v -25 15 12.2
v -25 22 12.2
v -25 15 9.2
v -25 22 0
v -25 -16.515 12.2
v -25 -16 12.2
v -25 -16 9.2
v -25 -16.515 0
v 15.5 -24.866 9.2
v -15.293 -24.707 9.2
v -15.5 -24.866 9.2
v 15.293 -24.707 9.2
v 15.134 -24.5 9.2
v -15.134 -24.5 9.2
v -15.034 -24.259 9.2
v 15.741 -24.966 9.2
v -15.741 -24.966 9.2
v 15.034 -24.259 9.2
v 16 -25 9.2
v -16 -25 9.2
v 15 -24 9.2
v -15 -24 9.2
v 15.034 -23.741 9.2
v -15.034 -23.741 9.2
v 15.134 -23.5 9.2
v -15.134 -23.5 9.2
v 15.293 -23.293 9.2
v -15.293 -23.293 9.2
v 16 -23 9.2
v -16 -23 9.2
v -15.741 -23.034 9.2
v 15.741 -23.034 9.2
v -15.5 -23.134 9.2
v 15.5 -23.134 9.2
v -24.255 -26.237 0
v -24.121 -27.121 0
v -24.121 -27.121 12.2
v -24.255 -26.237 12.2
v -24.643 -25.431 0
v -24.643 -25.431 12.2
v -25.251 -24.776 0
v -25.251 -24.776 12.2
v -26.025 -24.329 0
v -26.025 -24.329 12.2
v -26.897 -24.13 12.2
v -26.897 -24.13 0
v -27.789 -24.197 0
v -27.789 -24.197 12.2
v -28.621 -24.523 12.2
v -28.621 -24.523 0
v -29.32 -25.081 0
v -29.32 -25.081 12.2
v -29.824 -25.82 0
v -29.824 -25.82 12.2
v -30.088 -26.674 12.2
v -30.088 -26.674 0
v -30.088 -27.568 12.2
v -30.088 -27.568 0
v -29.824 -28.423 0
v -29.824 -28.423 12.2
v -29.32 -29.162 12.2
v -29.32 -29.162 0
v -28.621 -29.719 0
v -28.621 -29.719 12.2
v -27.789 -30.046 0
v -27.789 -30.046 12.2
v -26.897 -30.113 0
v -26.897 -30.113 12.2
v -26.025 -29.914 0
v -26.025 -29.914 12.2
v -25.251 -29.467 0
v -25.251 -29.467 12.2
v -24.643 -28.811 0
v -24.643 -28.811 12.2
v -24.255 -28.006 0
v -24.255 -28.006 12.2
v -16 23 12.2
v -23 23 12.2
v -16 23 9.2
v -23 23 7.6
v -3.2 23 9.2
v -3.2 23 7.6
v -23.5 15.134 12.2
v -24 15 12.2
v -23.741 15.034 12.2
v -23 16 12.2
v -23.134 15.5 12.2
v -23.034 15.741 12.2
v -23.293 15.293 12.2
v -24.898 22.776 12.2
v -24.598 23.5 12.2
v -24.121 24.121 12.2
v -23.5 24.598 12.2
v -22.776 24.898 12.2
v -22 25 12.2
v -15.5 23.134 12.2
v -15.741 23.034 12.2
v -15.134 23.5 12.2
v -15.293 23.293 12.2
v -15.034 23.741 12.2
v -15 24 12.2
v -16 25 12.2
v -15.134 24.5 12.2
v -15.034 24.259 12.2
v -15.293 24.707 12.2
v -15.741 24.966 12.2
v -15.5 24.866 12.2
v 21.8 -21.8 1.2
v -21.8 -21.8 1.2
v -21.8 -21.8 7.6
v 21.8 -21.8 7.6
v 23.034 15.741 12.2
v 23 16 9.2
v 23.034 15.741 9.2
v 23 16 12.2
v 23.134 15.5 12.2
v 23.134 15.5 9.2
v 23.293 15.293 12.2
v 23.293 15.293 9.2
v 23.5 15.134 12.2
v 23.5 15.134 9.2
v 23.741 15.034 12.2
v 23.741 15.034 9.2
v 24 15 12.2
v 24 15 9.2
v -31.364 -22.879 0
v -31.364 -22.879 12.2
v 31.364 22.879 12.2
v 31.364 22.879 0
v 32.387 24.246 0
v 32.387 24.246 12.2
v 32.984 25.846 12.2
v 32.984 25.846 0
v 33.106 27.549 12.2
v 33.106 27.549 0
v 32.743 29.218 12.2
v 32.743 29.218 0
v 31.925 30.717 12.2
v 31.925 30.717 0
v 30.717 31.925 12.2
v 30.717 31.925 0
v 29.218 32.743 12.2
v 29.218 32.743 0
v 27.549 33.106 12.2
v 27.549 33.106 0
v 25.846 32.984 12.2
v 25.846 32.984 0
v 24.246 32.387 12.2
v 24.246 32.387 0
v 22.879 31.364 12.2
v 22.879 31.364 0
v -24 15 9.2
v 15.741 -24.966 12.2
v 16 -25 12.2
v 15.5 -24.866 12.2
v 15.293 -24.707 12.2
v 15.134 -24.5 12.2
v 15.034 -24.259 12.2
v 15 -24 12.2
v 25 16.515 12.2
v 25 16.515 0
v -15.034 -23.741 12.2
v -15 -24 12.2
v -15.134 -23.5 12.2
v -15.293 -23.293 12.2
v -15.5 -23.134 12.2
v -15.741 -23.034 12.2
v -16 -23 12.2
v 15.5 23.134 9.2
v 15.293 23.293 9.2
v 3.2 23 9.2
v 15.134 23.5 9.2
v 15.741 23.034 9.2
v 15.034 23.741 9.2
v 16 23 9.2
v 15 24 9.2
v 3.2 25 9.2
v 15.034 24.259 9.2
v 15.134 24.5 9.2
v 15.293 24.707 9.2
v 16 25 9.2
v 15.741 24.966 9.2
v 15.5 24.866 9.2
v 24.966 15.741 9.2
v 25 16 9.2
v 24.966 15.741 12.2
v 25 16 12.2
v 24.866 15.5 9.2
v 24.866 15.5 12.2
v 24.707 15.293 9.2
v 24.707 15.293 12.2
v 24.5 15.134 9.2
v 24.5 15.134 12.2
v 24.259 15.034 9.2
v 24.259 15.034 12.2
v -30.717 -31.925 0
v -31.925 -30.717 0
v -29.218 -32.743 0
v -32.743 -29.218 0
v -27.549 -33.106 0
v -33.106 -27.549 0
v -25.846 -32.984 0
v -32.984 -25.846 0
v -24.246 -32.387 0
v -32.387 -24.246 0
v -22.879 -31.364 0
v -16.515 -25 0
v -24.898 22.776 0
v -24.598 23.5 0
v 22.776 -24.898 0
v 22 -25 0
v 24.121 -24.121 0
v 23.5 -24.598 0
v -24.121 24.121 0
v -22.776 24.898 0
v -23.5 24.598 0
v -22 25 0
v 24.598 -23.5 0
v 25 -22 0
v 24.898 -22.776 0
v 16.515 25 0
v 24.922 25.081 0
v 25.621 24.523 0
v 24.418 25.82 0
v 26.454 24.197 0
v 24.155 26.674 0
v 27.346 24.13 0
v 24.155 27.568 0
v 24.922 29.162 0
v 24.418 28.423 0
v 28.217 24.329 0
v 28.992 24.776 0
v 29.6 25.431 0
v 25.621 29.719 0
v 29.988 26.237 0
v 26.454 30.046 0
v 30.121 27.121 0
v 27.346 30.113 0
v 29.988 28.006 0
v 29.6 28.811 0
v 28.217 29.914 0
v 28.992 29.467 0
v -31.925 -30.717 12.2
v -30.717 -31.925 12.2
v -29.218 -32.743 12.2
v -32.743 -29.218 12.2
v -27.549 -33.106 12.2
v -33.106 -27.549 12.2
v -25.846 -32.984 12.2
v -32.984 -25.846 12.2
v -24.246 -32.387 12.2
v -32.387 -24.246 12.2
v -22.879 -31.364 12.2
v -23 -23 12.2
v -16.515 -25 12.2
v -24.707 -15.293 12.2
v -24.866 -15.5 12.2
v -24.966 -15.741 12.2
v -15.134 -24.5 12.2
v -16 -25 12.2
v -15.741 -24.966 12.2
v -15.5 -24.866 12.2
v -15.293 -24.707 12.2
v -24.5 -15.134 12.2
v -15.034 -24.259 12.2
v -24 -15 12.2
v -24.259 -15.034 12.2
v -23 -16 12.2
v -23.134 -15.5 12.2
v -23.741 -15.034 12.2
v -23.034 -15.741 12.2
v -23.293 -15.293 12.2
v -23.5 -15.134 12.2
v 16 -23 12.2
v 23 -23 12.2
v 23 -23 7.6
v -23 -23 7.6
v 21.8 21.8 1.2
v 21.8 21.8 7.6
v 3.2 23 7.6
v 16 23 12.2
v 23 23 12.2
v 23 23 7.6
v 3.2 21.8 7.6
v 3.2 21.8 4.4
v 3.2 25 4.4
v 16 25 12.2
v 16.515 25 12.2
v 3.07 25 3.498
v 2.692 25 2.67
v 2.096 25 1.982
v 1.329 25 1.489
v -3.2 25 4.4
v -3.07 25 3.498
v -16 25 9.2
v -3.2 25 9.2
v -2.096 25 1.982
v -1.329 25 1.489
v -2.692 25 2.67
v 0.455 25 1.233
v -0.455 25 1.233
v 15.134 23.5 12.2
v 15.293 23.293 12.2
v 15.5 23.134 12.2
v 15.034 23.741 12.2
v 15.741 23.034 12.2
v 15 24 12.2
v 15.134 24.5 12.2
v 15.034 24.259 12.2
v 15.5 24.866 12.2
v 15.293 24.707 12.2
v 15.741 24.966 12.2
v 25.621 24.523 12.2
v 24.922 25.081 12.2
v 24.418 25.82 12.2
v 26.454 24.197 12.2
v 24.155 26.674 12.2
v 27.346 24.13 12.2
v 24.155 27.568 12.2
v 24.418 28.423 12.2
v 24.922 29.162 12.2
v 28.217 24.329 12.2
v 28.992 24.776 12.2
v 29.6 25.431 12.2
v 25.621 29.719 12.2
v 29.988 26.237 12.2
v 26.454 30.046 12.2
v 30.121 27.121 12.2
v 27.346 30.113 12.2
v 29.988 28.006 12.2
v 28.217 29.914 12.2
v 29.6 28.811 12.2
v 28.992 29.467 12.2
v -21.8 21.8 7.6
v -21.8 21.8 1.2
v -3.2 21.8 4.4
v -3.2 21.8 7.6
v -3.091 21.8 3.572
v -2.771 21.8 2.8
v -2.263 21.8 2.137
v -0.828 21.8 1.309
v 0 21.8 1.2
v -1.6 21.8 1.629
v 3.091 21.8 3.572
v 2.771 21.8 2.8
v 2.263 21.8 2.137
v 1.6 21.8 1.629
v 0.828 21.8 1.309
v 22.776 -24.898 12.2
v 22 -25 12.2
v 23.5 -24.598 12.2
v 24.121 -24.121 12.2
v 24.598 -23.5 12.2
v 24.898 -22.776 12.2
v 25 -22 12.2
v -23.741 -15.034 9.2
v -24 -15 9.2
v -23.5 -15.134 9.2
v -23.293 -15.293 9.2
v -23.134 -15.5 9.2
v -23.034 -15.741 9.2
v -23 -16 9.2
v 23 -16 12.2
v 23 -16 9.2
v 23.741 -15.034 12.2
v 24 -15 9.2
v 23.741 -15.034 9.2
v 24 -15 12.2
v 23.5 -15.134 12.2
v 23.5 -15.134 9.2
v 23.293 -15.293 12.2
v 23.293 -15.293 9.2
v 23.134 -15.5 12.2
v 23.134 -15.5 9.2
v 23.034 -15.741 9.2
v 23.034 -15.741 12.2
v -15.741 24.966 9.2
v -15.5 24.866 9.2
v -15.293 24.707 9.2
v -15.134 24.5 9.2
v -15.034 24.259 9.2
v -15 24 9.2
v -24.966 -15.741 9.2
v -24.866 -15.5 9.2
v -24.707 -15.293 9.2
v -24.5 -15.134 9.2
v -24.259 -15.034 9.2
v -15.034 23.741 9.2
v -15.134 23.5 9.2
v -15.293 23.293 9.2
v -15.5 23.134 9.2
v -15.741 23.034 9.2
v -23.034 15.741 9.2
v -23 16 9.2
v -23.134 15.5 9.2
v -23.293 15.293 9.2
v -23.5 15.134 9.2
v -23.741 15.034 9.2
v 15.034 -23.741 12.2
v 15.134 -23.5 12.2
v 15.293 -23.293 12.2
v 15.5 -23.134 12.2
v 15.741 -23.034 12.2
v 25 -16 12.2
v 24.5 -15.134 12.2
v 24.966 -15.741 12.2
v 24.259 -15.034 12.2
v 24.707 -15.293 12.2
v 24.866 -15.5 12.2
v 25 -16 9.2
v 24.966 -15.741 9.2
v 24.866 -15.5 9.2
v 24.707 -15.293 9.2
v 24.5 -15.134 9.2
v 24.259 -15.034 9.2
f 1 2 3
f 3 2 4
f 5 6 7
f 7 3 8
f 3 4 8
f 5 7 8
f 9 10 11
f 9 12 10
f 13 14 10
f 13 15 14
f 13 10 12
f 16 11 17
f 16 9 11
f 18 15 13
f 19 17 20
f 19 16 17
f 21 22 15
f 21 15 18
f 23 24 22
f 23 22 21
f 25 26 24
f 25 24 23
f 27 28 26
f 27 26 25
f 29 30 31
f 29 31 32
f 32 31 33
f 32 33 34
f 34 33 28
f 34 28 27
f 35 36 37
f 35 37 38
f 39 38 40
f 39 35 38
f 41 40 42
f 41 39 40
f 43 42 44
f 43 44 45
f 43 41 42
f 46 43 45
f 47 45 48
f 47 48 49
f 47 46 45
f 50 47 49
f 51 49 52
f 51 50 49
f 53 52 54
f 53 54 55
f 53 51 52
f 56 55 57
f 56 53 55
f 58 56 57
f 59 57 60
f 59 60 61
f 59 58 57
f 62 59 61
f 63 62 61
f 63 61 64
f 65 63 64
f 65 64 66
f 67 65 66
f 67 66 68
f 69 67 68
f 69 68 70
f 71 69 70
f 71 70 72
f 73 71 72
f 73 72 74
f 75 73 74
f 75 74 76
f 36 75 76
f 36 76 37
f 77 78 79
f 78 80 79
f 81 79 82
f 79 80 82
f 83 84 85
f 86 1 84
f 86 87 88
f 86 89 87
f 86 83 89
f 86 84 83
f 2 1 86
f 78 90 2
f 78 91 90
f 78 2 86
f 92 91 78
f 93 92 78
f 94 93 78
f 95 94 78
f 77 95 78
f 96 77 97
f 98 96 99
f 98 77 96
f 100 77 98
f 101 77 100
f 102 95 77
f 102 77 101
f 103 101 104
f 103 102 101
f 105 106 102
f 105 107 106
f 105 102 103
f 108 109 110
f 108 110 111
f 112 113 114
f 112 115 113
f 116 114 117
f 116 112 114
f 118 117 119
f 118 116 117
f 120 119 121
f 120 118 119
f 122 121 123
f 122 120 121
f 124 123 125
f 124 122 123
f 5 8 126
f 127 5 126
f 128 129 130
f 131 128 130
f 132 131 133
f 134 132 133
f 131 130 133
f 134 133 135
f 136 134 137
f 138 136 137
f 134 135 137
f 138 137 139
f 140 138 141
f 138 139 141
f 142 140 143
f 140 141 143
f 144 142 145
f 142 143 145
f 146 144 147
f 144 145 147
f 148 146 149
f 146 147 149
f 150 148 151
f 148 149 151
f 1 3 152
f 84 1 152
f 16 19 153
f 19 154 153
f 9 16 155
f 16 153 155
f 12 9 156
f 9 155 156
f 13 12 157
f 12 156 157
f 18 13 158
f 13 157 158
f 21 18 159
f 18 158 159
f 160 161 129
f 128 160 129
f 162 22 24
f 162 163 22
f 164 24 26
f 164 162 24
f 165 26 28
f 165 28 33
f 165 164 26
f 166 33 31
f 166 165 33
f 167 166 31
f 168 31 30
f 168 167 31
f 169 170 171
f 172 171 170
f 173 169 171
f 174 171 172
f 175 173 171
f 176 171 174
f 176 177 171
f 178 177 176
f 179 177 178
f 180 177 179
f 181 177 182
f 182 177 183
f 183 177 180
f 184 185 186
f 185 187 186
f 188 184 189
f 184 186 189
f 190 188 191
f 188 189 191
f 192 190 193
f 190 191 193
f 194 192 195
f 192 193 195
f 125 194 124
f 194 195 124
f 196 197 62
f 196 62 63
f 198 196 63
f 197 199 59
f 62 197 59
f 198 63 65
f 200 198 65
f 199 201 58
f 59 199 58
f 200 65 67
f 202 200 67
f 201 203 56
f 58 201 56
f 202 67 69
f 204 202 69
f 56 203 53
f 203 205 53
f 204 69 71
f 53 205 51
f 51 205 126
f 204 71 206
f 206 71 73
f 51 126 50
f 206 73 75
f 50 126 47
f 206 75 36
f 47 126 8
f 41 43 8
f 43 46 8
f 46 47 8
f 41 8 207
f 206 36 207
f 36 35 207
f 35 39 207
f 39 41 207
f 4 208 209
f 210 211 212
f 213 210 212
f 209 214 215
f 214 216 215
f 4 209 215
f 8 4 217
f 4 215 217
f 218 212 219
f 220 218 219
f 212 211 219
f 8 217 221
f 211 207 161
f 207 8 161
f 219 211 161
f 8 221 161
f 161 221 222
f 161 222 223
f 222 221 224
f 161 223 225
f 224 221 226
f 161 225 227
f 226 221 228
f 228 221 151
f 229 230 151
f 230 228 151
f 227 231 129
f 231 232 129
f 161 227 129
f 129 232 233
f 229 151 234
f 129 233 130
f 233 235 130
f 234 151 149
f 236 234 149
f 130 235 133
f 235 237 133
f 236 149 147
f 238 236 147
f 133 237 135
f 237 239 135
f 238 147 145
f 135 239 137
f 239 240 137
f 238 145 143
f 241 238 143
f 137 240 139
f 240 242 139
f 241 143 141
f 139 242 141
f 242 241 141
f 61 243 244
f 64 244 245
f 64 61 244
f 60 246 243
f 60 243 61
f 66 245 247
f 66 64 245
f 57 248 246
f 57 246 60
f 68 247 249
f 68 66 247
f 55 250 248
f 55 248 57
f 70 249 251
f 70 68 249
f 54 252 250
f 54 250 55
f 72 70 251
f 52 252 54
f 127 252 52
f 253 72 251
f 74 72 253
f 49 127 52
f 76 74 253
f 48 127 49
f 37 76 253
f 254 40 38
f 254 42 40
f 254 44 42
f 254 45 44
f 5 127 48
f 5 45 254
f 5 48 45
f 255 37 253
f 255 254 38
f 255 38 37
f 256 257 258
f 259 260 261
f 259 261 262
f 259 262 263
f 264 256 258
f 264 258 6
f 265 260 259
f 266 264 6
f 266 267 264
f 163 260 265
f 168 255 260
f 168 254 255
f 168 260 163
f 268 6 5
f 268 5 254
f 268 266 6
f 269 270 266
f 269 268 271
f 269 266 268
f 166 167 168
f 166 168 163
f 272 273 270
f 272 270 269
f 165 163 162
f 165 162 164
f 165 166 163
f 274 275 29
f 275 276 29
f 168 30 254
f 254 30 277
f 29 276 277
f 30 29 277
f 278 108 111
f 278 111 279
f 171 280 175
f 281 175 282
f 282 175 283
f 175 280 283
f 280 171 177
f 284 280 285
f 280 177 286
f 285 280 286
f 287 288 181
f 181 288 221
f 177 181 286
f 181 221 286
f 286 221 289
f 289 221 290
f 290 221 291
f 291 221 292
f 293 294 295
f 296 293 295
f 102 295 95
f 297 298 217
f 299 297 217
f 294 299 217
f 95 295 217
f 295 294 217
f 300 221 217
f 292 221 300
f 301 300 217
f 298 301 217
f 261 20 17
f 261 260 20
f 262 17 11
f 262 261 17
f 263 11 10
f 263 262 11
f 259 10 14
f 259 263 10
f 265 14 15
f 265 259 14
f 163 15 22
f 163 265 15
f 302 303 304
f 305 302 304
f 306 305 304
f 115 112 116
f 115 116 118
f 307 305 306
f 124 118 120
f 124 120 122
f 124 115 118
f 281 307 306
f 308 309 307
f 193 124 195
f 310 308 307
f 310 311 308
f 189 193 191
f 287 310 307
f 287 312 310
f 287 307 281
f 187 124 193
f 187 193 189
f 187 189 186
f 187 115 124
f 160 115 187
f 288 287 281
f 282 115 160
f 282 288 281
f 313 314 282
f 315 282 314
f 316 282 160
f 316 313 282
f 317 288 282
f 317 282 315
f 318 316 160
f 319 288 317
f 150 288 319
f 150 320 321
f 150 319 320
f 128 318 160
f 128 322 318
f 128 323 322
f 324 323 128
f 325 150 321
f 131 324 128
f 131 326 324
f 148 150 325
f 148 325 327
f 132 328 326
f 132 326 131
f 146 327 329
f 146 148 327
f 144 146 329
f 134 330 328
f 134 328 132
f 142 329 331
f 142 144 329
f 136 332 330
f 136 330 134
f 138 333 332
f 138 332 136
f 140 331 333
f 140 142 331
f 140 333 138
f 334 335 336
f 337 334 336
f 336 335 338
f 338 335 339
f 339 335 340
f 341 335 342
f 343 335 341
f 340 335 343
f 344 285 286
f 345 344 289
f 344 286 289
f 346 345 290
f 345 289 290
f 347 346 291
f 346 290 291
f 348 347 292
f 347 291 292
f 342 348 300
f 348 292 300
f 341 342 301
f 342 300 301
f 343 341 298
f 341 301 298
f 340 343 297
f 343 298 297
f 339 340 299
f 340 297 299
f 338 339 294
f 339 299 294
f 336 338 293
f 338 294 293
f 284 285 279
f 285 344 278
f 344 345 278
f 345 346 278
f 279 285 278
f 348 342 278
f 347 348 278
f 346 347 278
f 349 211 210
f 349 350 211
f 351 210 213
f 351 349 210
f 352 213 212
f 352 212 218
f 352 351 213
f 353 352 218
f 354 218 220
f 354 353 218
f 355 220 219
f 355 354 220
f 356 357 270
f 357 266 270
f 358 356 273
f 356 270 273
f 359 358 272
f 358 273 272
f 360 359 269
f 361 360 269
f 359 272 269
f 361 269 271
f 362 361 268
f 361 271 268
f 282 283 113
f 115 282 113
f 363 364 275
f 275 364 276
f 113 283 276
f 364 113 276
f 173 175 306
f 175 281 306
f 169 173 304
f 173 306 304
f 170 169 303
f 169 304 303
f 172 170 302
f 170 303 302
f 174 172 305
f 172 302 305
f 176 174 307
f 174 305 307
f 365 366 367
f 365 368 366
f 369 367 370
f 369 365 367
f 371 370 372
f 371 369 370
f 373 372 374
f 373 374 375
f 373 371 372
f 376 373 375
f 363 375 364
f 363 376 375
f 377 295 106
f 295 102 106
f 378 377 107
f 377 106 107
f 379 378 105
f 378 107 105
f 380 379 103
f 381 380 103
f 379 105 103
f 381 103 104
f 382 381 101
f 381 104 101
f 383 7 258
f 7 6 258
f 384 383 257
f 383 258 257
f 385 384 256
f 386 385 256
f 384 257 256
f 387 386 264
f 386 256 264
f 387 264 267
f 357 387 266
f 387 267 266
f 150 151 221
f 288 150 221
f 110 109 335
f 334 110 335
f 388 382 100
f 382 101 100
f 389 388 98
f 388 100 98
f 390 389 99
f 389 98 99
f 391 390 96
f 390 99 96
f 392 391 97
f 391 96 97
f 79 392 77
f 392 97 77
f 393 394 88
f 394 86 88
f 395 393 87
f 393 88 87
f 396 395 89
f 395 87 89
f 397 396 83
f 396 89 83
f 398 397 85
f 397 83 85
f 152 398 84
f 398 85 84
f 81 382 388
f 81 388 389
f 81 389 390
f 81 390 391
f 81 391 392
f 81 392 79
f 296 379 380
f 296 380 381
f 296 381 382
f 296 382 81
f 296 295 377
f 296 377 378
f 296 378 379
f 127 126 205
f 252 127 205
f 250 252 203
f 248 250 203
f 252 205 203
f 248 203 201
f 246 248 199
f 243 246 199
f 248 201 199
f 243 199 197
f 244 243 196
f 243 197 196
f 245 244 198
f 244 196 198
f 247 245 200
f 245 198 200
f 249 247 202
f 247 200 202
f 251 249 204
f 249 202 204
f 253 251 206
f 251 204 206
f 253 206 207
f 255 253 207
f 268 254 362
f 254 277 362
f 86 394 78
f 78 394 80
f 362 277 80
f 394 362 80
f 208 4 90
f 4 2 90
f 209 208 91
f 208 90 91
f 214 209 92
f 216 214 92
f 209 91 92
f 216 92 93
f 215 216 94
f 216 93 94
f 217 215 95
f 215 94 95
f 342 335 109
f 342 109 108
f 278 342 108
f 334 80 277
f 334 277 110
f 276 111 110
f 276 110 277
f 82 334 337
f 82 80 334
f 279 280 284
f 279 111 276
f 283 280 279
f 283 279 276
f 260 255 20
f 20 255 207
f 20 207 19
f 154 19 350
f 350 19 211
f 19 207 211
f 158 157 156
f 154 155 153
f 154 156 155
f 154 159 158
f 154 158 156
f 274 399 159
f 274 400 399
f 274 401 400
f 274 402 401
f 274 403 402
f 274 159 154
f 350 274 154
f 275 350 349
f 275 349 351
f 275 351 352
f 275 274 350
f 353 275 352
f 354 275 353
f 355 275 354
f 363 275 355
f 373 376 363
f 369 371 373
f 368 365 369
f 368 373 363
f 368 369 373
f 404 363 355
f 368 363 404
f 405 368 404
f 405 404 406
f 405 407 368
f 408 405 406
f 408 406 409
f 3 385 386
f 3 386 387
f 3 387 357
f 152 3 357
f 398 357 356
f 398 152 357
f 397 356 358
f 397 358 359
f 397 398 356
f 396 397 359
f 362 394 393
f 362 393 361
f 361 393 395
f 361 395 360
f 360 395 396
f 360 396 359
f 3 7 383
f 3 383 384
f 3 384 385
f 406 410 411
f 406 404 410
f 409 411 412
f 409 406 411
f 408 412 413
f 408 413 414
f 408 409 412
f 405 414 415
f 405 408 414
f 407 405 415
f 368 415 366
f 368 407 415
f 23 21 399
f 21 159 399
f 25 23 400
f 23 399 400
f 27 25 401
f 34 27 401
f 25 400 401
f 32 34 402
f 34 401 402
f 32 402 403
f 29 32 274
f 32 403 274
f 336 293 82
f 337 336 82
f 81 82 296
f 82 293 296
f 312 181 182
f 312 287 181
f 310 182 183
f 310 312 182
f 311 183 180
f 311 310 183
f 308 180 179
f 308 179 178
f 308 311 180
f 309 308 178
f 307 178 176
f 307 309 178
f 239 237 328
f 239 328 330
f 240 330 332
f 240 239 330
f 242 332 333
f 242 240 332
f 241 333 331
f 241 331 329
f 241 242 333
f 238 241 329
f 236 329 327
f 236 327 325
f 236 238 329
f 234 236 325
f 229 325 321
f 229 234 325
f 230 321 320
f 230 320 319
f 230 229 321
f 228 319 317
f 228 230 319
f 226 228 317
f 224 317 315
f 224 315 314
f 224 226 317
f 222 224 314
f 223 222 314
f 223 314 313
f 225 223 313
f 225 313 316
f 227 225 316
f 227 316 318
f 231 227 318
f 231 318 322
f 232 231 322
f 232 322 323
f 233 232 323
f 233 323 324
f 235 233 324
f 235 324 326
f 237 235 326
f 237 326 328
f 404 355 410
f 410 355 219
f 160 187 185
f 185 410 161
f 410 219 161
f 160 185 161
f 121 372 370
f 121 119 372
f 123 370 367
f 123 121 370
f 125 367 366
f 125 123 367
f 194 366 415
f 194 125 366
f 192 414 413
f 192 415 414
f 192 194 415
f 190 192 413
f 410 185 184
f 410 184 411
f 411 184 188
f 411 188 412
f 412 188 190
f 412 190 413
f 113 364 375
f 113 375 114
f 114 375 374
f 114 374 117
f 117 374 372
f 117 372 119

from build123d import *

# Parameters (mm, degrees)
F0_R     = 3
F1_DEPTH = 1.2
F2_R     = 3
F2_W     = 43.6
F2_H     = 43.6
F3_DEPTH = 6.4
F4_R     = 3
F4_W     = 46
F4_H     = 46
F5_DEPTH = 1.6
F6_R     = 3
F7_DEPTH = 3
F9_DEPTH = 3.2
F10_R    = 0.99999
F11_R    = 3


# Not quite as in the source:
# - a fillet or chamfer is up to 0.001 mm smaller than in the source, because OpenCascade refuses the exact size


with BuildPart() as f1:
    # F0 (on Top) → F1 (new body)
    with BuildSketch(Plane.XY):
        with BuildLine():
            Line((22.8786796564, 31.3639610307), (16.5147186258, 25))
            Line((16.5147186258, 25), (-25, 25))
            Line((-25, 25), (-25, -16.5147186258))
            Line((-25, -16.5147186258), (-31.3639610307, -22.8786796564))
            ThreePointArc((-31.3639610307, -22.8786796564), (-31.3639610307, -31.3639610307), (-22.8786796564, -31.3639610307))
            Line((-22.8786796564, -31.3639610307), (-16.5147186258, -25))
            Line((-16.5147186258, -25), (25, -25))
            Line((25, -25), (25, 16.5147186258))
            Line((25, 16.5147186258), (31.3639610307, 22.8786796564))
            ThreePointArc((31.3639610307, 22.8786796564), (31.3639610307, 31.3639610307), (22.8786796564, 31.3639610307))
        make_face()
        with Locations((-27.1213203436, -27.1213203436)):
            Circle(F0_R, mode=Mode.SUBTRACT)
        with Locations((27.1213203436, 27.1213203436)):
            Circle(F0_R, mode=Mode.SUBTRACT)
    extrude(amount=F1_DEPTH)

    # F2 (on face) → F3 (join)
    with BuildSketch(Plane.XY.offset(1.2)):
        with BuildLine():
            Line((-16.5147186258, -25), (25, -25))
            Line((25, -25), (25, 16.5147186258))
            Line((25, 16.5147186258), (31.3639610307, 22.8786796564))
            ThreePointArc((31.3639610307, 22.8786796564), (31.3639610307, 31.3639610307), (22.8786796564, 31.3639610307))
            Line((22.8786796564, 31.3639610307), (16.5147186258, 25))
            Line((16.5147186258, 25), (-25, 25))
            Line((-25, 25), (-25, -16.5147186258))
            Line((-25, -16.5147186258), (-31.3639610307, -22.8786796564))
            ThreePointArc((-31.3639610307, -22.8786796564), (-31.3639610307, -31.3639610307), (-22.8786796564, -31.3639610307))
            Line((-22.8786796564, -31.3639610307), (-16.5147186258, -25))
        make_face()
        with Locations((-27.1213203436, -27.1213203436)):
            Circle(F2_R, mode=Mode.SUBTRACT)
        Rectangle(F2_W, F2_H, mode=Mode.SUBTRACT)
        with Locations((27.1213203436, 27.1213203436)):
            Circle(F2_R, mode=Mode.SUBTRACT)
    extrude(amount=F3_DEPTH)

    # F4 (on face) → F5 (join)
    with BuildSketch(Plane.XY.offset(7.6)):
        with BuildLine():
            Line((-16.5147186258, -25), (25, -25))
            Line((25, -25), (25, 16.5147186258))
            Line((25, 16.5147186258), (31.3639610307, 22.8786796564))
            ThreePointArc((31.3639610307, 22.8786796564), (31.3639610307, 31.3639610307), (22.8786796564, 31.3639610307))
            Line((22.8786796564, 31.3639610307), (16.5147186258, 25))
            Line((16.5147186258, 25), (-25, 25))
            Line((-25, 25), (-25, -16.5147186258))
            Line((-25, -16.5147186258), (-31.3639610307, -22.8786796564))
            ThreePointArc((-31.3639610307, -22.8786796564), (-31.3639610307, -31.3639610307), (-22.8786796564, -31.3639610307))
            Line((-22.8786796564, -31.3639610307), (-16.5147186258, -25))
        make_face()
        with Locations((-27.1213203436, -27.1213203436)):
            Circle(F4_R, mode=Mode.SUBTRACT)
        Rectangle(F4_W, F4_H, mode=Mode.SUBTRACT)
        with Locations((27.1213203436, 27.1213203436)):
            Circle(F4_R, mode=Mode.SUBTRACT)
    extrude(amount=F5_DEPTH)

    # F6 (on face) → F7 (join)
    with BuildSketch(Plane.XY.offset(9.2)):
        Polygon((15, -25), (25, -25), (25, -15), (23, -15), (23, -23), (15, -23), align=None)
        with BuildLine():
            Line((25, 15), (25, 16.5147186258))
            Line((25, 16.5147186258), (31.3639610307, 22.8786796564))
            ThreePointArc((31.3639610307, 22.8786796564), (31.3639610307, 31.3639610307), (22.8786796564, 31.3639610307))
            Line((22.8786796564, 31.3639610307), (16.5147186258, 25))
            Line((16.5147186258, 25), (15, 25))
            Line((15, 25), (15, 23))
            Line((15, 23), (23, 23))
            Line((23, 23), (23, 15))
            Line((23, 15), (25, 15))
        make_face()
        with Locations((27.1213203436, 27.1213203436)):
            Circle(F6_R, mode=Mode.SUBTRACT)
        Polygon((-15, 25), (-25, 25), (-25, 15), (-23, 15), (-23, 23), (-15, 23), align=None)
        with BuildLine():
            Line((-25, -15), (-25, -16.5147186258))
            Line((-25, -16.5147186258), (-31.3639610307, -22.8786796564))
            ThreePointArc((-31.3639610307, -22.8786796564), (-31.3639610307, -31.3639610307), (-22.8786796564, -31.3639610307))
            Line((-22.8786796564, -31.3639610307), (-16.5147186258, -25))
            Line((-16.5147186258, -25), (-15, -25))
            Line((-15, -25), (-15, -23))
            Line((-15, -23), (-23, -23))
            Line((-23, -23), (-23, -15))
            Line((-23, -15), (-25, -15))
        make_face()
        with Locations((-27.1213203436, -27.1213203436)):
            Circle(F6_R, mode=Mode.SUBTRACT)
    extrude(amount=F7_DEPTH)

    # F8 (on face) → F9 (cut, through all)
    with BuildSketch(Plane(origin=(0, 25, 0), x_dir=(-1, 0, 0), z_dir=(0, 1, 0))):
        with BuildLine():
            Line((-3.2, 9.2), (-3.2, 4.4))
            ThreePointArc((-3.2, 4.4), (0, 1.2), (3.2, 4.4))
            Line((3.2, 4.4), (3.2, 9.2))
            Line((3.2, 9.2), (-3.2, 9.2))
        make_face()
    extrude(amount=-F9_DEPTH, mode=Mode.SUBTRACT)

    # F10 (radius 1 in the source; OpenCascade refuses exactly that, so slightly less here)
    f10_edges = [f1.edges().sort_by_distance(p)[0] for p in [
        (25, -15, 10.7),
        (23, -15, 10.7),
        (15, -25, 10.7),
        (15, -23, 10.7),
        (-15, -25, 10.7),
        (-15, -23, 10.7),
        (-23, -15, 10.7),
        (-23, 15, 10.7),
        (-25, -15, 10.7),
        (-15, 23, 10.7),
        (-15, 25, 10.7),
        (15, 23, 10.7),
        (15, 25, 10.7),
        (23, 15, 10.7),
        (25, 15, 10.7),
    ]]
    fillet(f10_edges, radius=F10_R)

    # F11
    f11_edges = [f1.edges().sort_by_distance(p)[0] for p in [
        (-25, 25, 6.1),
        (25, -25, 6.1),
    ]]
    fillet(f11_edges, radius=F11_R)


solid = f1.part
